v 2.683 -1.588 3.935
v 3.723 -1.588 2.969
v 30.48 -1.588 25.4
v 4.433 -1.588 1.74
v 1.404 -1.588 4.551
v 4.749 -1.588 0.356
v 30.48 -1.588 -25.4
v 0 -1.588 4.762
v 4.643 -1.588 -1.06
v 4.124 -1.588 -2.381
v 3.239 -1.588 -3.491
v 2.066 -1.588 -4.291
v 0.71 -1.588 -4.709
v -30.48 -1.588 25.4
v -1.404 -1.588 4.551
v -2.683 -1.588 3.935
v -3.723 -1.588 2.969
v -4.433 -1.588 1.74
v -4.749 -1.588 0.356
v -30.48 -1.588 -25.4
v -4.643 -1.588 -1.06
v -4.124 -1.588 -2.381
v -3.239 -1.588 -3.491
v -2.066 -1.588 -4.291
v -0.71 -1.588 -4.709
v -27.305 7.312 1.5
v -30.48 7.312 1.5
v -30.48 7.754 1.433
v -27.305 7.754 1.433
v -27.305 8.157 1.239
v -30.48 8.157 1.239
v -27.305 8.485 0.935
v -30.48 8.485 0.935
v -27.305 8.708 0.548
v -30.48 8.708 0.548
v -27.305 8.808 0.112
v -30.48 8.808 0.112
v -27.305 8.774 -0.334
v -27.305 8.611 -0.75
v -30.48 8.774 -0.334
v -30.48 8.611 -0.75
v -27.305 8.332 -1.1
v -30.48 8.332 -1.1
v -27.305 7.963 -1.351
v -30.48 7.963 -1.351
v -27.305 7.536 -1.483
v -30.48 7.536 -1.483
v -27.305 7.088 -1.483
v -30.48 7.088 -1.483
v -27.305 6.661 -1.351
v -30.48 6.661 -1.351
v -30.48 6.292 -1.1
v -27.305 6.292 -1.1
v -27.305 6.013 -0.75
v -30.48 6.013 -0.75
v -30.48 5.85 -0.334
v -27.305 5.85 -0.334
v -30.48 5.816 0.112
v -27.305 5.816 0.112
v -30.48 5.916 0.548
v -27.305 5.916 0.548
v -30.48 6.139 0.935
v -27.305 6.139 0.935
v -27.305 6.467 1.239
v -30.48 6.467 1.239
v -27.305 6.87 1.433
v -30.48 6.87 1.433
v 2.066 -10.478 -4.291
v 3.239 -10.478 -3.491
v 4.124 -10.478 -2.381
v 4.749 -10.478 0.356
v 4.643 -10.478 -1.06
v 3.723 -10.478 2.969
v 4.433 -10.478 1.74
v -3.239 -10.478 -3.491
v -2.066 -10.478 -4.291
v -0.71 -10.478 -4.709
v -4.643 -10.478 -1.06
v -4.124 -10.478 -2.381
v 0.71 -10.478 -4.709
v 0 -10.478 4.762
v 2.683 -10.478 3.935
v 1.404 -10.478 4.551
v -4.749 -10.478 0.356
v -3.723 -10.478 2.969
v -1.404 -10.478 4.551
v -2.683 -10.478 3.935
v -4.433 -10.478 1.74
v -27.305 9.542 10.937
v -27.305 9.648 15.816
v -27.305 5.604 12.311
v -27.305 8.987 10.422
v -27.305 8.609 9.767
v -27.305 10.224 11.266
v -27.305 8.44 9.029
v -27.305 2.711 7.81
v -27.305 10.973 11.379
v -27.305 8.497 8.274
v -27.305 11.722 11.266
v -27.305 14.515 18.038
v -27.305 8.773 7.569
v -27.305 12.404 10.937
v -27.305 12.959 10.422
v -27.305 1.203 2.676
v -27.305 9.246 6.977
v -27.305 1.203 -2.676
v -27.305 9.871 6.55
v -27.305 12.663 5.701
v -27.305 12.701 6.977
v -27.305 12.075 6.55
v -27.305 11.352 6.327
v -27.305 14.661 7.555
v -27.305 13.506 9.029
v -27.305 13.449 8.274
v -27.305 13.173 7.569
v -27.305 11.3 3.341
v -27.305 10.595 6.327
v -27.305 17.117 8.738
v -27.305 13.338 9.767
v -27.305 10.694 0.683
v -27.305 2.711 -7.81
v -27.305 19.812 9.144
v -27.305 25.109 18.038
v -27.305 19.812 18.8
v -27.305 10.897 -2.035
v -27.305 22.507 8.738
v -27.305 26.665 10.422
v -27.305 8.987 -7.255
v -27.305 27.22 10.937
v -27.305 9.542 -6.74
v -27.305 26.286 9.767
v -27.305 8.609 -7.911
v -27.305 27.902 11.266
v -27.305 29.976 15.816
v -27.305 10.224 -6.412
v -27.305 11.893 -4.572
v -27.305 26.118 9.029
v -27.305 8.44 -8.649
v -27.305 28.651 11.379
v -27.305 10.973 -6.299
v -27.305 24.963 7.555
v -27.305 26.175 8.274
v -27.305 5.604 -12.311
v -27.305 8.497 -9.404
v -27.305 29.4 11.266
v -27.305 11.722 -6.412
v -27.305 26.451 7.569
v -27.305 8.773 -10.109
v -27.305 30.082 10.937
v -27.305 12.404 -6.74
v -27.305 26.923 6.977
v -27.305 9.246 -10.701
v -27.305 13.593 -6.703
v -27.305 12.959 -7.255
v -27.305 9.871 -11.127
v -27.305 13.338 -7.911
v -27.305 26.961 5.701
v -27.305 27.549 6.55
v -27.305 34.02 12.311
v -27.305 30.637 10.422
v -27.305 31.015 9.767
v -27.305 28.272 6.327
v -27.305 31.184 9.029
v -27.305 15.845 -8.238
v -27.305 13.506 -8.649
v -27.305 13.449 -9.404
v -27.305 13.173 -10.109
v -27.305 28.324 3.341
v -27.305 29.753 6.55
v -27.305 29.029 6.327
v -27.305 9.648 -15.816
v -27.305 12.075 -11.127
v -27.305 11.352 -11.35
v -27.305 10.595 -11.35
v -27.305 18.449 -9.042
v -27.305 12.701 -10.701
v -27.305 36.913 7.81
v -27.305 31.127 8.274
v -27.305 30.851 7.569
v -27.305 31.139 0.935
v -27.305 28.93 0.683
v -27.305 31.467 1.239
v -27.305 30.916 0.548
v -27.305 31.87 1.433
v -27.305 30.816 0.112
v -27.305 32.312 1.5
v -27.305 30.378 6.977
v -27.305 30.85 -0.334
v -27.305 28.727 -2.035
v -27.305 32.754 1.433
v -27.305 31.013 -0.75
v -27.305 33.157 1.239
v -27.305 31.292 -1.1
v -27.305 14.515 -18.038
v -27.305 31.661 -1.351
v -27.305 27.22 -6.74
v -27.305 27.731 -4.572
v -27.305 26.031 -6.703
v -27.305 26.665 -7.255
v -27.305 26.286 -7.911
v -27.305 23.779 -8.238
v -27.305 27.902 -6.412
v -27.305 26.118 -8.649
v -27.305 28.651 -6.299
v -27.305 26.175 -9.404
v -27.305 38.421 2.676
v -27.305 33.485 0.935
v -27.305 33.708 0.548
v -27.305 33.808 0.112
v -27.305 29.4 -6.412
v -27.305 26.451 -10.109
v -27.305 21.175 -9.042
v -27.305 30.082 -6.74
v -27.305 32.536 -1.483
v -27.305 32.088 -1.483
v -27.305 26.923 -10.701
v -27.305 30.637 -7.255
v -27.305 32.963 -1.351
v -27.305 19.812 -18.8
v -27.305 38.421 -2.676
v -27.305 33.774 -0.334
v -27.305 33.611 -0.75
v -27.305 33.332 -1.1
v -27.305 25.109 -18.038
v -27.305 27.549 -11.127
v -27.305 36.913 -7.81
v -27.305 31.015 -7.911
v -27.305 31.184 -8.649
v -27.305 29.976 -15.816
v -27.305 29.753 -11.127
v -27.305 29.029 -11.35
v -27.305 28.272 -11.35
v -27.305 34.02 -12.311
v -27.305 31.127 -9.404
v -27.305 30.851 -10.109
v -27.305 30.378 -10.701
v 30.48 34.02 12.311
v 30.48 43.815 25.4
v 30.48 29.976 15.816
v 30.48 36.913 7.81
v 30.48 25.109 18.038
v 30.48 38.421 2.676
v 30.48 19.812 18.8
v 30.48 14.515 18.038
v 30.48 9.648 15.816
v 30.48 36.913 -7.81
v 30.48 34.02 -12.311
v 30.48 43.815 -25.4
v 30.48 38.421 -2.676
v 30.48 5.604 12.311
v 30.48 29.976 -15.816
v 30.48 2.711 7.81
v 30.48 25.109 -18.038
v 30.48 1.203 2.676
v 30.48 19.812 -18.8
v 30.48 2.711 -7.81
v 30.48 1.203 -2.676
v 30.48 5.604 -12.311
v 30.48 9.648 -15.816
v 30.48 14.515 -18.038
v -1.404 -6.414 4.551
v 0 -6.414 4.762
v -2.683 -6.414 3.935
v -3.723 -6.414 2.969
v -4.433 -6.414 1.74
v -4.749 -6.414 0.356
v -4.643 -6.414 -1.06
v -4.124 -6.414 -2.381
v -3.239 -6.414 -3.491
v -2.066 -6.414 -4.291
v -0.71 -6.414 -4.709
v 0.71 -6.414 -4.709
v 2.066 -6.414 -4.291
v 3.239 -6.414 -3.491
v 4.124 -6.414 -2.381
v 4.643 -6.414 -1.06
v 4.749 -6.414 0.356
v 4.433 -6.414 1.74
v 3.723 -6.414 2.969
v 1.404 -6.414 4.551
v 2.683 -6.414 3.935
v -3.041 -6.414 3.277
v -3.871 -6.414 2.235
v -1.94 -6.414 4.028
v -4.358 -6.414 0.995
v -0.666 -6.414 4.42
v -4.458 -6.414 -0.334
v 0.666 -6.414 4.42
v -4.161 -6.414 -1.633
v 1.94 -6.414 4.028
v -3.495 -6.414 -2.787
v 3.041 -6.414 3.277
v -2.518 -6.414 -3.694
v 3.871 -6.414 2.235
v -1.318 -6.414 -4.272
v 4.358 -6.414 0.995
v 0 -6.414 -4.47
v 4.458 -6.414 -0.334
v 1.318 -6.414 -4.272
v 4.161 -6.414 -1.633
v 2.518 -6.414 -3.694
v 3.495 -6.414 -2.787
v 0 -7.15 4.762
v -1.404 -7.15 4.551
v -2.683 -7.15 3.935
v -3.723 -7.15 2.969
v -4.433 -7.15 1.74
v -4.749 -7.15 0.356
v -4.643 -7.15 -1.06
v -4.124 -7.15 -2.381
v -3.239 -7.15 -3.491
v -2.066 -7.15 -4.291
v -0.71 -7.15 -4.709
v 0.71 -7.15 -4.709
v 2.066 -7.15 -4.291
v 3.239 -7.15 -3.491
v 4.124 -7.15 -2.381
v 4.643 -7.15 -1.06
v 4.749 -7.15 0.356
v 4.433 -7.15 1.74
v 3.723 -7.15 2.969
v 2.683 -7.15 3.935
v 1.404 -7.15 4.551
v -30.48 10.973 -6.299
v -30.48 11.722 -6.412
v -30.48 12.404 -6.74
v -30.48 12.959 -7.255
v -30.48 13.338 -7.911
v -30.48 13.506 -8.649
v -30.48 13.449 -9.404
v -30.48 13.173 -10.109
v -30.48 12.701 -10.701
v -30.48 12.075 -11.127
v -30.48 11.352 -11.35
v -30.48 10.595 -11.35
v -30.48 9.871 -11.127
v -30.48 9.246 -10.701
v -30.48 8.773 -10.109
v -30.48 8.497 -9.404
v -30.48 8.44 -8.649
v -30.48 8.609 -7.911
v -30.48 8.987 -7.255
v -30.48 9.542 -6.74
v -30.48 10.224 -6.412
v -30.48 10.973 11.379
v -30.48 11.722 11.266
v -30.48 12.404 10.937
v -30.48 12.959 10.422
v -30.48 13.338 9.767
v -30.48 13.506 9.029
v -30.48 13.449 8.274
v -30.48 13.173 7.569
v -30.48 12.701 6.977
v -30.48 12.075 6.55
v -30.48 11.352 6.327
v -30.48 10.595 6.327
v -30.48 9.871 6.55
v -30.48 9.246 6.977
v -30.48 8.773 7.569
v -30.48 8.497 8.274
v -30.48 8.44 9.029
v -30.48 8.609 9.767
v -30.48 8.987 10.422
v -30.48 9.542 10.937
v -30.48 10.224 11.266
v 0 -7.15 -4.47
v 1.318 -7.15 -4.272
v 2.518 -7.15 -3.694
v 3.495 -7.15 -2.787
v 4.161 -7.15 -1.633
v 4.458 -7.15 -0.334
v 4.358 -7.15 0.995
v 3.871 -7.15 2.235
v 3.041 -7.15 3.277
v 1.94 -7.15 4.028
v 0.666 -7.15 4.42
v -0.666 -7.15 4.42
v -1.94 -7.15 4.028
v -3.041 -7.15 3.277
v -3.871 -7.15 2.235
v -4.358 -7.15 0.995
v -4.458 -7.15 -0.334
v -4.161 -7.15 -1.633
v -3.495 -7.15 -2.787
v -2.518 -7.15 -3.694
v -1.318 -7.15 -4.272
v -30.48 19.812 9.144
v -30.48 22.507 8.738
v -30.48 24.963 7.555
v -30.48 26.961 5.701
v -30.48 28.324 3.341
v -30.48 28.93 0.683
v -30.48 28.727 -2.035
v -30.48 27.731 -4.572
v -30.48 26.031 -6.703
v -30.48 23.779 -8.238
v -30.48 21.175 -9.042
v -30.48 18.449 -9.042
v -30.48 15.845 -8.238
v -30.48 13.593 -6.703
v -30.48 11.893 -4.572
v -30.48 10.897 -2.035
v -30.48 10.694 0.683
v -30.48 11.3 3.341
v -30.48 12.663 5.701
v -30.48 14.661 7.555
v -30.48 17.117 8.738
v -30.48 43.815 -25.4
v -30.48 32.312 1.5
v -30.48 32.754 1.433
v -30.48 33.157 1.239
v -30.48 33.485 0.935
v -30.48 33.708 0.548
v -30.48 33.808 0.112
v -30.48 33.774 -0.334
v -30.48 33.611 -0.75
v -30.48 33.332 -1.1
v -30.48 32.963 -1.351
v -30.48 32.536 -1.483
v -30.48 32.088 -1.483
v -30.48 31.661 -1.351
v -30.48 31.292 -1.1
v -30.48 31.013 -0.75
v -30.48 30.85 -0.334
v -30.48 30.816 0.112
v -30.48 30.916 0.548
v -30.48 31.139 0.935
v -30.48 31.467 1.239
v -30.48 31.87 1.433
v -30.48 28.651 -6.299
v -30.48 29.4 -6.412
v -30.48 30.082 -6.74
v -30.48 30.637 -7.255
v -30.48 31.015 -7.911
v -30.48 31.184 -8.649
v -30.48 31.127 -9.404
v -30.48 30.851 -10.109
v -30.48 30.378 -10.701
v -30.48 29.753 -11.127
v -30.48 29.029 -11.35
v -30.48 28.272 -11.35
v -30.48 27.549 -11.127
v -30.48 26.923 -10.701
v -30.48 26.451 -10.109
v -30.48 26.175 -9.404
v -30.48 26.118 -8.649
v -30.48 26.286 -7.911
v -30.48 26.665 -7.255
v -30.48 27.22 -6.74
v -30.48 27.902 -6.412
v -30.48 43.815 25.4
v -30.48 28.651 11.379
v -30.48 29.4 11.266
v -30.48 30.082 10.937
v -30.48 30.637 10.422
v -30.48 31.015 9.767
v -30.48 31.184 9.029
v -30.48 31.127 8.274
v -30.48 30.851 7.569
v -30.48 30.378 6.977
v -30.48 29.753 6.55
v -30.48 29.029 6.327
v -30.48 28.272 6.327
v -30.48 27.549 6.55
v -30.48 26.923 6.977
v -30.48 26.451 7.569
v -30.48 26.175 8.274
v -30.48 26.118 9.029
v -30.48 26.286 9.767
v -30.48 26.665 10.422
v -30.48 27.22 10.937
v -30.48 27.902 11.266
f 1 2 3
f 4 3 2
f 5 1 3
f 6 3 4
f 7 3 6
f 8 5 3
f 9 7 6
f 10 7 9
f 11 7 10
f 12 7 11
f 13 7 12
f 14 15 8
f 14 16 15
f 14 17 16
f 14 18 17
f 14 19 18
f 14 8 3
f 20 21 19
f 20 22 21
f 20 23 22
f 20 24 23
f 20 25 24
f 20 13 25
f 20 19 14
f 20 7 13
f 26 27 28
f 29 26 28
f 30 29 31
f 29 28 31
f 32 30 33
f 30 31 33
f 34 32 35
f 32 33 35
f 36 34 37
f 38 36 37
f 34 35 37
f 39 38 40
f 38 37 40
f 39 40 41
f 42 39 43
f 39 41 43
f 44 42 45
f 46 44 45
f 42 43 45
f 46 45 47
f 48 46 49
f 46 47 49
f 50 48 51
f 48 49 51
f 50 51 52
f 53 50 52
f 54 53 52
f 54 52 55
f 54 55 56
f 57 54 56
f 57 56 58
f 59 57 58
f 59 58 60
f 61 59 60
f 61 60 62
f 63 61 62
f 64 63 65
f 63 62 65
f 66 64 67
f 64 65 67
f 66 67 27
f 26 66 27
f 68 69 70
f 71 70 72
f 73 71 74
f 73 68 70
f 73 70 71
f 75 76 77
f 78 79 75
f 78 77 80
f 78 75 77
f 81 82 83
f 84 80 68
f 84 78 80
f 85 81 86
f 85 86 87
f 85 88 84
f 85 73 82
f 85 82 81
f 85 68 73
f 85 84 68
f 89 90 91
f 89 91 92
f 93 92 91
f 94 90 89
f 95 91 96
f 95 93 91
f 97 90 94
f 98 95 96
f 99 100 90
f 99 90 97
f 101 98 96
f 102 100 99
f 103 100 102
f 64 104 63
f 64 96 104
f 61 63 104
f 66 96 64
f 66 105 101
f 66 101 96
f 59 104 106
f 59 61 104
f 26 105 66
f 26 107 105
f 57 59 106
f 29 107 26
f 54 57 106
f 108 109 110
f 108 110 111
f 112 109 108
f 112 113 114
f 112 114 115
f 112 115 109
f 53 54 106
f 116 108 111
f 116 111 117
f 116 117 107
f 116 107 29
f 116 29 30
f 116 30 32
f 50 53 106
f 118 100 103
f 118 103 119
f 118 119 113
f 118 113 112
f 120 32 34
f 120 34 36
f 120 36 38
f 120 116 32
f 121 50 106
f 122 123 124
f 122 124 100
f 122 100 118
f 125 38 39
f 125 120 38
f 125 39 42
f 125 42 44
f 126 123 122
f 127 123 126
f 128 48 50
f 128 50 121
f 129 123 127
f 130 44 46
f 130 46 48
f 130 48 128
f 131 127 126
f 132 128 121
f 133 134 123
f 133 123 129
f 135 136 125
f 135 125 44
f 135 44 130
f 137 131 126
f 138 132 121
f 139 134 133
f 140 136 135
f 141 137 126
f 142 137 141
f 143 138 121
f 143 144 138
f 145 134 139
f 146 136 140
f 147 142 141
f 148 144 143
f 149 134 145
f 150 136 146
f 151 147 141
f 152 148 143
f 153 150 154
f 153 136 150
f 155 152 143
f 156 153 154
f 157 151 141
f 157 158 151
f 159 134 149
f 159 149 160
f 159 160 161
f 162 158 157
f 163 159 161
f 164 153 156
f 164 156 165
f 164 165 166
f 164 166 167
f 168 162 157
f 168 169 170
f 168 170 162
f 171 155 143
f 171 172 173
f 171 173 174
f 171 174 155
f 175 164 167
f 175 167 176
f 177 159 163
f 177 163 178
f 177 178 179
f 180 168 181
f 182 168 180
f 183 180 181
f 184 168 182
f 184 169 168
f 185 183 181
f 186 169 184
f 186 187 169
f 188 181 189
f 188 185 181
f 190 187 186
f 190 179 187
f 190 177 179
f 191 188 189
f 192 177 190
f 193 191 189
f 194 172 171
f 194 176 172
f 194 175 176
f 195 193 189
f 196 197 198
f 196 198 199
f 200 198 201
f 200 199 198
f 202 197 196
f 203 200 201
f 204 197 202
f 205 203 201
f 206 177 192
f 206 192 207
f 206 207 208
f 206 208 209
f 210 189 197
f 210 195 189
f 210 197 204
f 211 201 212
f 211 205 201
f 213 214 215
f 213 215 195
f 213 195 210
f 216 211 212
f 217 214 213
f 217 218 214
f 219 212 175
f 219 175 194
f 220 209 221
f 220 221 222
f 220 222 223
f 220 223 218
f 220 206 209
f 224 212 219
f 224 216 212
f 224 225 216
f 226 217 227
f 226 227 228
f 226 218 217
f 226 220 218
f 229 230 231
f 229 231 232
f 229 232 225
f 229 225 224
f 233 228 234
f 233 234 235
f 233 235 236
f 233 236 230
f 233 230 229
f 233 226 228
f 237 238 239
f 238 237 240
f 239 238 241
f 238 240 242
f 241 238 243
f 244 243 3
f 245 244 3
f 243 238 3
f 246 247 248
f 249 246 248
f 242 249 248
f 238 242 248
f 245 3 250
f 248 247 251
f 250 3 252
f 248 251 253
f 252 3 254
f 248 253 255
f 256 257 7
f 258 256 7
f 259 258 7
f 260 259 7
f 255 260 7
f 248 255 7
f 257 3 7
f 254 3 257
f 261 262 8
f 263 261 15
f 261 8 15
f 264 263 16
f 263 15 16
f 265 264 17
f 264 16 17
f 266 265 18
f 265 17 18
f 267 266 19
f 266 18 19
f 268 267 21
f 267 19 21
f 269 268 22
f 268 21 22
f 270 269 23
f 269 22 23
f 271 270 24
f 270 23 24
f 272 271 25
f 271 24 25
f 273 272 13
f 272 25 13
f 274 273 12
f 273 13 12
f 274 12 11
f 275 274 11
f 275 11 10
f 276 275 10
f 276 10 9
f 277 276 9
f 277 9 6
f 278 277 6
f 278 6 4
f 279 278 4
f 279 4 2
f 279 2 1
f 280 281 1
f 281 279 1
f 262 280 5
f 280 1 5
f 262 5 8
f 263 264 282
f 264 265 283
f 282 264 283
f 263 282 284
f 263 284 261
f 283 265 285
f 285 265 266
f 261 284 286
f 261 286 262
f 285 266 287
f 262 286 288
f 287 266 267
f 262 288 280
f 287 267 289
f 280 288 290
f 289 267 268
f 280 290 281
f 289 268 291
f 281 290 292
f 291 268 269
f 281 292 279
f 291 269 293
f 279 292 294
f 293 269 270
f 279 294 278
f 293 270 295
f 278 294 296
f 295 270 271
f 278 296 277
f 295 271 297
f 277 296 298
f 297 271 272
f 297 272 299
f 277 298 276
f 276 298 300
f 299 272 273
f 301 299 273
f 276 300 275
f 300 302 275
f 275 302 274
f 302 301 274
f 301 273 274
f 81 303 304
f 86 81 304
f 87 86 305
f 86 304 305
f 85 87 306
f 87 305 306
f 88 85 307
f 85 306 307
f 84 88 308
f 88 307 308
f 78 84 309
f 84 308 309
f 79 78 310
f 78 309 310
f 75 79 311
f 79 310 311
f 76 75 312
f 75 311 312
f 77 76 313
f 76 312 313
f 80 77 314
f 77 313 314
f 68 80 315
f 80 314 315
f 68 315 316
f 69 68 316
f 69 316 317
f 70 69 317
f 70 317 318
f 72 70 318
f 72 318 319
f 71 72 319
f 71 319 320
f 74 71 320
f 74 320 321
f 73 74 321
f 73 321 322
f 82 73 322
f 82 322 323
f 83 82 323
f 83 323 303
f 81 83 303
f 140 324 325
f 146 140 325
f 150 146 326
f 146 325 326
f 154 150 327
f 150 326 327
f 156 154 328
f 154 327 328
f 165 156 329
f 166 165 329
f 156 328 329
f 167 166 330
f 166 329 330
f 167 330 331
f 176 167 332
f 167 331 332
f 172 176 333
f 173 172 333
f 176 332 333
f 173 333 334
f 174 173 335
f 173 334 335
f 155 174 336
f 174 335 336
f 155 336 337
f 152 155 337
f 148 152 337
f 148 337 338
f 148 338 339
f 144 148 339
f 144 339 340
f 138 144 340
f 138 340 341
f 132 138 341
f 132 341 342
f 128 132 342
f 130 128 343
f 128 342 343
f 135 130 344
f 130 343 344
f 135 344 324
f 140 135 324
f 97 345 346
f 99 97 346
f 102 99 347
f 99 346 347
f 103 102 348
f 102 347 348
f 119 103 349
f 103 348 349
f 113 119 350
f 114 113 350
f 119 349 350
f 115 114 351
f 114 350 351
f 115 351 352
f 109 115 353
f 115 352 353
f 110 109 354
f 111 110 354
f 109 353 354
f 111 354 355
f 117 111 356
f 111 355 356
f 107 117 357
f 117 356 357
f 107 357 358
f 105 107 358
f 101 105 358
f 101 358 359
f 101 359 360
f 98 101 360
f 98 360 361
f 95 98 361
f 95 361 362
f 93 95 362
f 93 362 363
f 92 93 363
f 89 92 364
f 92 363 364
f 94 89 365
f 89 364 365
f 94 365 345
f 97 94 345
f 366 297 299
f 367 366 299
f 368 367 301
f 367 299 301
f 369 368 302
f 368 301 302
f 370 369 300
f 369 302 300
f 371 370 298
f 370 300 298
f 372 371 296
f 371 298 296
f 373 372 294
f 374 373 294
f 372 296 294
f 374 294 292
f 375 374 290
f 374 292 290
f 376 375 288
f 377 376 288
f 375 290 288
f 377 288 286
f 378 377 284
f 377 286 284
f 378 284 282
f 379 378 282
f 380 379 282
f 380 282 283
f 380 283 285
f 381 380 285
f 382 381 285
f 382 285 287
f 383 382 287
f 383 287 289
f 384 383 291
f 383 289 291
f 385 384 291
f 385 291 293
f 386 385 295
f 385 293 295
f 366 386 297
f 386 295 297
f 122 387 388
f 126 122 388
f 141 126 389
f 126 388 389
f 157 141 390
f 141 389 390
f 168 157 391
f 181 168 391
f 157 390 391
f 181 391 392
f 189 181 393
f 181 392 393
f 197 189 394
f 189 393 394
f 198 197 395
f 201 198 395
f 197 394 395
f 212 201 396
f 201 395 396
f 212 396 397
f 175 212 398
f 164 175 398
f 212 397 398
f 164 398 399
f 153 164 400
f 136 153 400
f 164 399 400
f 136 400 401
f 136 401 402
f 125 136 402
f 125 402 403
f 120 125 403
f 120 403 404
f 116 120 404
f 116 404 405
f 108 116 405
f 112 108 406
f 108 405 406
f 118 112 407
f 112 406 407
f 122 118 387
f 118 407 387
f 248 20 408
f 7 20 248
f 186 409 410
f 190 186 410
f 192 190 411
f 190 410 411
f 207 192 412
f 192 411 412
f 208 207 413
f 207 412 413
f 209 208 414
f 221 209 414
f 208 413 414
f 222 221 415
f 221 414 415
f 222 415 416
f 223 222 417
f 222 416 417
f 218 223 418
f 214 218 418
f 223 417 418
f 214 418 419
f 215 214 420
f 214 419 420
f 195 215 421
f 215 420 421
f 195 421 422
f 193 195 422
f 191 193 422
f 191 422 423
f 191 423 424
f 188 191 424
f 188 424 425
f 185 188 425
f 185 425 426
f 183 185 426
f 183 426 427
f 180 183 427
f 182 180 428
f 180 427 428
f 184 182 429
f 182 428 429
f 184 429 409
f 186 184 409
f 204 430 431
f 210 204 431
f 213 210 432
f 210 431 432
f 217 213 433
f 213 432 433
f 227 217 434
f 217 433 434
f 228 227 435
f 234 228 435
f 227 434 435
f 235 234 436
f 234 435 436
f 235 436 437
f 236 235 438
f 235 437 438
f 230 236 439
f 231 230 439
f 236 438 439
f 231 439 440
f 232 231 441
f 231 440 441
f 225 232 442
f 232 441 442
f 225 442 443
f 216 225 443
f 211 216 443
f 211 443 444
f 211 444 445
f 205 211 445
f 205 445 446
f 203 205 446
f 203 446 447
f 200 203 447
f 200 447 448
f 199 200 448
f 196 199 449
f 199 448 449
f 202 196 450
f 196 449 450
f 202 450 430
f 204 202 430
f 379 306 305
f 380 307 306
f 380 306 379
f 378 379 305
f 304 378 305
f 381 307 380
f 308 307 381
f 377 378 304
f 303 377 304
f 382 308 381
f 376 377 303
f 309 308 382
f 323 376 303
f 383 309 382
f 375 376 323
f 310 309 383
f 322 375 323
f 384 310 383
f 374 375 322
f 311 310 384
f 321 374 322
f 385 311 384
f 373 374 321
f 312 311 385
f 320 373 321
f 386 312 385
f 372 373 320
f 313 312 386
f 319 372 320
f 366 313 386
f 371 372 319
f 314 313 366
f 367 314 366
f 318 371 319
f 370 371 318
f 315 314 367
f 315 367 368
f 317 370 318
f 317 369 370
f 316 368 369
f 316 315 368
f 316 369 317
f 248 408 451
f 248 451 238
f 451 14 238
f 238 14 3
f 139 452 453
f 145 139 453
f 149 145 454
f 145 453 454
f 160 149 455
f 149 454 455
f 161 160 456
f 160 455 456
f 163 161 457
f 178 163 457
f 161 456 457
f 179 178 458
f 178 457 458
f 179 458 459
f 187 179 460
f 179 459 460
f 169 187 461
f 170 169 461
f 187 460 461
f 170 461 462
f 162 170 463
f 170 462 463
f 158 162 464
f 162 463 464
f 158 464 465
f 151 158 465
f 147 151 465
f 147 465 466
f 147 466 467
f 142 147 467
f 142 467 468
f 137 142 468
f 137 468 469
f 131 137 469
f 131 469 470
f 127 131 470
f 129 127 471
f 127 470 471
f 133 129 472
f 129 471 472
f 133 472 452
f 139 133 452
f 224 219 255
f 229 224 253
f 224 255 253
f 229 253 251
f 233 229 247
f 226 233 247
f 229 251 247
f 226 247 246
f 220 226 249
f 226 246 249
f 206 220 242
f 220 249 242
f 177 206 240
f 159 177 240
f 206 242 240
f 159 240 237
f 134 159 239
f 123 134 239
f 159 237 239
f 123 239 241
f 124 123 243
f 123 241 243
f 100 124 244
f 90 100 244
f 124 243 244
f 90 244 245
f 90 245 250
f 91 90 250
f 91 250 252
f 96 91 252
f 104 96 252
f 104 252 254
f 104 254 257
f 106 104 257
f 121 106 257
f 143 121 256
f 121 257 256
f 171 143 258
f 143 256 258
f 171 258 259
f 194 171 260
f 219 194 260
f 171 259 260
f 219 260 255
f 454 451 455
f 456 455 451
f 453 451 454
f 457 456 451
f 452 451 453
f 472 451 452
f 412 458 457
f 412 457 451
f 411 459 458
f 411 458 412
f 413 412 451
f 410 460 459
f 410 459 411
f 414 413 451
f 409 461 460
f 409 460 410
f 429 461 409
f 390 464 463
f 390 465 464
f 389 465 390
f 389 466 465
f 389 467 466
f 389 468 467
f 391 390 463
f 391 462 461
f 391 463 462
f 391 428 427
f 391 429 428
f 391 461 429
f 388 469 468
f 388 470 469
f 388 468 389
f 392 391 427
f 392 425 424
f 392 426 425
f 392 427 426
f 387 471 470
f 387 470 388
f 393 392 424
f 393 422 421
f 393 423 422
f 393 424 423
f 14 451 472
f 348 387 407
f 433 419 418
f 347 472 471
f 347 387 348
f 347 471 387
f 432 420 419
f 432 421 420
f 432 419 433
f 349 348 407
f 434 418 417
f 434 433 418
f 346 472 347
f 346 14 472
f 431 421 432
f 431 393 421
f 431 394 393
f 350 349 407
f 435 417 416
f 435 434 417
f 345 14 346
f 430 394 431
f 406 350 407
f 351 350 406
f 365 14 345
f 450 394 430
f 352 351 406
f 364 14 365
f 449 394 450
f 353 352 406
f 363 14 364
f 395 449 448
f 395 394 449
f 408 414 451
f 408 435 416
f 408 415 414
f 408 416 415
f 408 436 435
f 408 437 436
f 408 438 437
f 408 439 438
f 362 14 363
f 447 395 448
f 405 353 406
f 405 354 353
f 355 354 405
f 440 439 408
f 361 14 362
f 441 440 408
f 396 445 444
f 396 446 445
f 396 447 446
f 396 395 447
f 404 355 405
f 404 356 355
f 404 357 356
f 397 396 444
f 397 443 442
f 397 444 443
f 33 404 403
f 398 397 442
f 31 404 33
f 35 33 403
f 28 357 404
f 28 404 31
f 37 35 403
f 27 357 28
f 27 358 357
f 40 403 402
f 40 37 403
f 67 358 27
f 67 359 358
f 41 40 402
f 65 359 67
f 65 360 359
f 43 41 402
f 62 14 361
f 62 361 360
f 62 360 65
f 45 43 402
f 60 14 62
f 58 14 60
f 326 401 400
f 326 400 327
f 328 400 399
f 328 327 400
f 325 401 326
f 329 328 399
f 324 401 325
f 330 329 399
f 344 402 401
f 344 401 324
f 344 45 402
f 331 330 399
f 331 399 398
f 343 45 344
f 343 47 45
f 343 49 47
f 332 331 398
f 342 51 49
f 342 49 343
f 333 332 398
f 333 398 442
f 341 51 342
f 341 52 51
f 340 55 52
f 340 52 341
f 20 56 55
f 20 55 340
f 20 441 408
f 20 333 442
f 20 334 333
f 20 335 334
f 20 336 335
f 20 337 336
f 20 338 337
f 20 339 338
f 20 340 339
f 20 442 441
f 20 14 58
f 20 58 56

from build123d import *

# Parameters (mm, degrees)
SKETCH1_W              = 60.96
SKETCH1_H              = 50.8
BOSS_EXTRUDE1_DEPTH    = 40.64
SKETCH3_W              = 60.96
SKETCH3_H              = 50.8
BOSS_EXTRUDE2_DEPTH    = 1.5875
SKETCH2_R              = 18.8
CUT_EXTRUDE1_DEPTH     = 57.785
SKETCH4_W              = 60.96
SKETCH4_H              = 50.8
BOSS_EXTRUDE3_DEPTH    = 3.175
SKETCH6_R              = 9.144
CUT_EXTRUDE2_DEPTH     = 3.175
SKETCH7_R              = 1.5
CUT_EXTRUDE3_DEPTH     = 3.175
SKETCH8_R              = 4.7625
BOSS_EXTRUDE4_DEPTH    = 8.89
CUT_EXTRUDE4_START     = -7.1501
CUT_EXTRUDE4_OUTLINE_R = 4.7625
CUT_EXTRUDE4_DEPTH     = 0.7366
SKETCH9_R              = 4.4704
BOSS_EXTRUDE5_DEPTH    = 0.7366
SKETCH13_R             = 2.54
CUT_EXTRUDE6_DEPTH     = 3.175


# Read off the part's stored shape, not the designer's step: Cut-Extrude4
with BuildPart() as part:
    # Sketch1 → Boss-Extrude1 (new body)
    with BuildSketch(Plane(origin=(0, 0, 0), x_dir=(1, 0, 0), z_dir=(0, 1, 0))):
        Rectangle(SKETCH1_W, SKETCH1_H)
    extrude(amount=BOSS_EXTRUDE1_DEPTH)

    # Sketch3 → Boss-Extrude2 (add)
    with BuildSketch(Plane(origin=(0, 0, 0), x_dir=(-1, 0, 0), z_dir=(0, -1, 0))):
        Rectangle(SKETCH3_W, SKETCH3_H)
    extrude(amount=BOSS_EXTRUDE2_DEPTH)

    # Sketch2 → Cut-Extrude1 (cut)
    with BuildSketch(Plane(origin=(30.48, 0, 0), x_dir=(0, 0, -1), z_dir=(1, 0, 0))):
        with Locations((0, 19.812)):
            Circle(SKETCH2_R)
    extrude(amount=-CUT_EXTRUDE1_DEPTH, mode=Mode.SUBTRACT)

    # Sketch4 → Boss-Extrude3 (add)
    with BuildSketch(Plane(origin=(0, 40.64, 0), x_dir=(1, 0, 0), z_dir=(0, 1, 0))):
        Rectangle(SKETCH4_W, SKETCH4_H)
    extrude(amount=BOSS_EXTRUDE3_DEPTH)

    # Sketch6 → Cut-Extrude2 (cut)
    with BuildSketch(Plane.ZY.offset(30.48)):
        with Locations((0, 19.812)):
            Circle(SKETCH6_R)
    extrude(amount=-CUT_EXTRUDE2_DEPTH, mode=Mode.SUBTRACT)

    # Sketch7 → Cut-Extrude3 (cut)
    with BuildSketch(Plane.ZY.offset(30.48)):
        with Locations((0, 32.312000019)):
            Circle(SKETCH7_R)
        with Locations((0, 7.311999981)):
            Circle(SKETCH7_R)
    extrude(amount=-CUT_EXTRUDE3_DEPTH, mode=Mode.SUBTRACT)

    # Sketch8 → Boss-Extrude4 (add)
    with BuildSketch(Plane.XZ.offset(1.5875)):
        with Locations(Location((0, 0, 0), (0, 0, 90))):
            Circle(SKETCH8_R)
    extrude(amount=BOSS_EXTRUDE4_DEPTH)

    # Cut-Extrude4 outline → Cut-Extrude4 (cut)
    with BuildSketch(Plane(origin=(0, 0, 0), x_dir=(1, 0, 0), z_dir=(0, 1, 0)).offset(CUT_EXTRUDE4_START)):
        Circle(CUT_EXTRUDE4_OUTLINE_R)
    extrude(amount=CUT_EXTRUDE4_DEPTH, mode=Mode.SUBTRACT)

    # Sketch9 → Boss-Extrude5 (add)
    with BuildSketch(Plane(origin=(0, -6.4135, 0), x_dir=(-1, 0, 0), z_dir=(0, -1, 0))):
        with Locations(Location((0, 0, 0), (0, 0, 90))):
            Circle(SKETCH9_R)
    extrude(amount=BOSS_EXTRUDE5_DEPTH)

    # Sketch13 → Cut-Extrude6 (cut)
    with BuildSketch(Plane.ZY.offset(30.48)):
        with Locations((8.838834778, 28.650834778)):
            Circle(SKETCH13_R)
        with Locations((-8.838834778, 28.650834778)):
            Circle(SKETCH13_R)
        with Locations((-8.838834778, 10.973165222)):
            Circle(SKETCH13_R)
        with Locations((8.838834778, 10.973165222)):
            Circle(SKETCH13_R)
    extrude(amount=-CUT_EXTRUDE6_DEPTH, mode=Mode.SUBTRACT)


solid = part.part
